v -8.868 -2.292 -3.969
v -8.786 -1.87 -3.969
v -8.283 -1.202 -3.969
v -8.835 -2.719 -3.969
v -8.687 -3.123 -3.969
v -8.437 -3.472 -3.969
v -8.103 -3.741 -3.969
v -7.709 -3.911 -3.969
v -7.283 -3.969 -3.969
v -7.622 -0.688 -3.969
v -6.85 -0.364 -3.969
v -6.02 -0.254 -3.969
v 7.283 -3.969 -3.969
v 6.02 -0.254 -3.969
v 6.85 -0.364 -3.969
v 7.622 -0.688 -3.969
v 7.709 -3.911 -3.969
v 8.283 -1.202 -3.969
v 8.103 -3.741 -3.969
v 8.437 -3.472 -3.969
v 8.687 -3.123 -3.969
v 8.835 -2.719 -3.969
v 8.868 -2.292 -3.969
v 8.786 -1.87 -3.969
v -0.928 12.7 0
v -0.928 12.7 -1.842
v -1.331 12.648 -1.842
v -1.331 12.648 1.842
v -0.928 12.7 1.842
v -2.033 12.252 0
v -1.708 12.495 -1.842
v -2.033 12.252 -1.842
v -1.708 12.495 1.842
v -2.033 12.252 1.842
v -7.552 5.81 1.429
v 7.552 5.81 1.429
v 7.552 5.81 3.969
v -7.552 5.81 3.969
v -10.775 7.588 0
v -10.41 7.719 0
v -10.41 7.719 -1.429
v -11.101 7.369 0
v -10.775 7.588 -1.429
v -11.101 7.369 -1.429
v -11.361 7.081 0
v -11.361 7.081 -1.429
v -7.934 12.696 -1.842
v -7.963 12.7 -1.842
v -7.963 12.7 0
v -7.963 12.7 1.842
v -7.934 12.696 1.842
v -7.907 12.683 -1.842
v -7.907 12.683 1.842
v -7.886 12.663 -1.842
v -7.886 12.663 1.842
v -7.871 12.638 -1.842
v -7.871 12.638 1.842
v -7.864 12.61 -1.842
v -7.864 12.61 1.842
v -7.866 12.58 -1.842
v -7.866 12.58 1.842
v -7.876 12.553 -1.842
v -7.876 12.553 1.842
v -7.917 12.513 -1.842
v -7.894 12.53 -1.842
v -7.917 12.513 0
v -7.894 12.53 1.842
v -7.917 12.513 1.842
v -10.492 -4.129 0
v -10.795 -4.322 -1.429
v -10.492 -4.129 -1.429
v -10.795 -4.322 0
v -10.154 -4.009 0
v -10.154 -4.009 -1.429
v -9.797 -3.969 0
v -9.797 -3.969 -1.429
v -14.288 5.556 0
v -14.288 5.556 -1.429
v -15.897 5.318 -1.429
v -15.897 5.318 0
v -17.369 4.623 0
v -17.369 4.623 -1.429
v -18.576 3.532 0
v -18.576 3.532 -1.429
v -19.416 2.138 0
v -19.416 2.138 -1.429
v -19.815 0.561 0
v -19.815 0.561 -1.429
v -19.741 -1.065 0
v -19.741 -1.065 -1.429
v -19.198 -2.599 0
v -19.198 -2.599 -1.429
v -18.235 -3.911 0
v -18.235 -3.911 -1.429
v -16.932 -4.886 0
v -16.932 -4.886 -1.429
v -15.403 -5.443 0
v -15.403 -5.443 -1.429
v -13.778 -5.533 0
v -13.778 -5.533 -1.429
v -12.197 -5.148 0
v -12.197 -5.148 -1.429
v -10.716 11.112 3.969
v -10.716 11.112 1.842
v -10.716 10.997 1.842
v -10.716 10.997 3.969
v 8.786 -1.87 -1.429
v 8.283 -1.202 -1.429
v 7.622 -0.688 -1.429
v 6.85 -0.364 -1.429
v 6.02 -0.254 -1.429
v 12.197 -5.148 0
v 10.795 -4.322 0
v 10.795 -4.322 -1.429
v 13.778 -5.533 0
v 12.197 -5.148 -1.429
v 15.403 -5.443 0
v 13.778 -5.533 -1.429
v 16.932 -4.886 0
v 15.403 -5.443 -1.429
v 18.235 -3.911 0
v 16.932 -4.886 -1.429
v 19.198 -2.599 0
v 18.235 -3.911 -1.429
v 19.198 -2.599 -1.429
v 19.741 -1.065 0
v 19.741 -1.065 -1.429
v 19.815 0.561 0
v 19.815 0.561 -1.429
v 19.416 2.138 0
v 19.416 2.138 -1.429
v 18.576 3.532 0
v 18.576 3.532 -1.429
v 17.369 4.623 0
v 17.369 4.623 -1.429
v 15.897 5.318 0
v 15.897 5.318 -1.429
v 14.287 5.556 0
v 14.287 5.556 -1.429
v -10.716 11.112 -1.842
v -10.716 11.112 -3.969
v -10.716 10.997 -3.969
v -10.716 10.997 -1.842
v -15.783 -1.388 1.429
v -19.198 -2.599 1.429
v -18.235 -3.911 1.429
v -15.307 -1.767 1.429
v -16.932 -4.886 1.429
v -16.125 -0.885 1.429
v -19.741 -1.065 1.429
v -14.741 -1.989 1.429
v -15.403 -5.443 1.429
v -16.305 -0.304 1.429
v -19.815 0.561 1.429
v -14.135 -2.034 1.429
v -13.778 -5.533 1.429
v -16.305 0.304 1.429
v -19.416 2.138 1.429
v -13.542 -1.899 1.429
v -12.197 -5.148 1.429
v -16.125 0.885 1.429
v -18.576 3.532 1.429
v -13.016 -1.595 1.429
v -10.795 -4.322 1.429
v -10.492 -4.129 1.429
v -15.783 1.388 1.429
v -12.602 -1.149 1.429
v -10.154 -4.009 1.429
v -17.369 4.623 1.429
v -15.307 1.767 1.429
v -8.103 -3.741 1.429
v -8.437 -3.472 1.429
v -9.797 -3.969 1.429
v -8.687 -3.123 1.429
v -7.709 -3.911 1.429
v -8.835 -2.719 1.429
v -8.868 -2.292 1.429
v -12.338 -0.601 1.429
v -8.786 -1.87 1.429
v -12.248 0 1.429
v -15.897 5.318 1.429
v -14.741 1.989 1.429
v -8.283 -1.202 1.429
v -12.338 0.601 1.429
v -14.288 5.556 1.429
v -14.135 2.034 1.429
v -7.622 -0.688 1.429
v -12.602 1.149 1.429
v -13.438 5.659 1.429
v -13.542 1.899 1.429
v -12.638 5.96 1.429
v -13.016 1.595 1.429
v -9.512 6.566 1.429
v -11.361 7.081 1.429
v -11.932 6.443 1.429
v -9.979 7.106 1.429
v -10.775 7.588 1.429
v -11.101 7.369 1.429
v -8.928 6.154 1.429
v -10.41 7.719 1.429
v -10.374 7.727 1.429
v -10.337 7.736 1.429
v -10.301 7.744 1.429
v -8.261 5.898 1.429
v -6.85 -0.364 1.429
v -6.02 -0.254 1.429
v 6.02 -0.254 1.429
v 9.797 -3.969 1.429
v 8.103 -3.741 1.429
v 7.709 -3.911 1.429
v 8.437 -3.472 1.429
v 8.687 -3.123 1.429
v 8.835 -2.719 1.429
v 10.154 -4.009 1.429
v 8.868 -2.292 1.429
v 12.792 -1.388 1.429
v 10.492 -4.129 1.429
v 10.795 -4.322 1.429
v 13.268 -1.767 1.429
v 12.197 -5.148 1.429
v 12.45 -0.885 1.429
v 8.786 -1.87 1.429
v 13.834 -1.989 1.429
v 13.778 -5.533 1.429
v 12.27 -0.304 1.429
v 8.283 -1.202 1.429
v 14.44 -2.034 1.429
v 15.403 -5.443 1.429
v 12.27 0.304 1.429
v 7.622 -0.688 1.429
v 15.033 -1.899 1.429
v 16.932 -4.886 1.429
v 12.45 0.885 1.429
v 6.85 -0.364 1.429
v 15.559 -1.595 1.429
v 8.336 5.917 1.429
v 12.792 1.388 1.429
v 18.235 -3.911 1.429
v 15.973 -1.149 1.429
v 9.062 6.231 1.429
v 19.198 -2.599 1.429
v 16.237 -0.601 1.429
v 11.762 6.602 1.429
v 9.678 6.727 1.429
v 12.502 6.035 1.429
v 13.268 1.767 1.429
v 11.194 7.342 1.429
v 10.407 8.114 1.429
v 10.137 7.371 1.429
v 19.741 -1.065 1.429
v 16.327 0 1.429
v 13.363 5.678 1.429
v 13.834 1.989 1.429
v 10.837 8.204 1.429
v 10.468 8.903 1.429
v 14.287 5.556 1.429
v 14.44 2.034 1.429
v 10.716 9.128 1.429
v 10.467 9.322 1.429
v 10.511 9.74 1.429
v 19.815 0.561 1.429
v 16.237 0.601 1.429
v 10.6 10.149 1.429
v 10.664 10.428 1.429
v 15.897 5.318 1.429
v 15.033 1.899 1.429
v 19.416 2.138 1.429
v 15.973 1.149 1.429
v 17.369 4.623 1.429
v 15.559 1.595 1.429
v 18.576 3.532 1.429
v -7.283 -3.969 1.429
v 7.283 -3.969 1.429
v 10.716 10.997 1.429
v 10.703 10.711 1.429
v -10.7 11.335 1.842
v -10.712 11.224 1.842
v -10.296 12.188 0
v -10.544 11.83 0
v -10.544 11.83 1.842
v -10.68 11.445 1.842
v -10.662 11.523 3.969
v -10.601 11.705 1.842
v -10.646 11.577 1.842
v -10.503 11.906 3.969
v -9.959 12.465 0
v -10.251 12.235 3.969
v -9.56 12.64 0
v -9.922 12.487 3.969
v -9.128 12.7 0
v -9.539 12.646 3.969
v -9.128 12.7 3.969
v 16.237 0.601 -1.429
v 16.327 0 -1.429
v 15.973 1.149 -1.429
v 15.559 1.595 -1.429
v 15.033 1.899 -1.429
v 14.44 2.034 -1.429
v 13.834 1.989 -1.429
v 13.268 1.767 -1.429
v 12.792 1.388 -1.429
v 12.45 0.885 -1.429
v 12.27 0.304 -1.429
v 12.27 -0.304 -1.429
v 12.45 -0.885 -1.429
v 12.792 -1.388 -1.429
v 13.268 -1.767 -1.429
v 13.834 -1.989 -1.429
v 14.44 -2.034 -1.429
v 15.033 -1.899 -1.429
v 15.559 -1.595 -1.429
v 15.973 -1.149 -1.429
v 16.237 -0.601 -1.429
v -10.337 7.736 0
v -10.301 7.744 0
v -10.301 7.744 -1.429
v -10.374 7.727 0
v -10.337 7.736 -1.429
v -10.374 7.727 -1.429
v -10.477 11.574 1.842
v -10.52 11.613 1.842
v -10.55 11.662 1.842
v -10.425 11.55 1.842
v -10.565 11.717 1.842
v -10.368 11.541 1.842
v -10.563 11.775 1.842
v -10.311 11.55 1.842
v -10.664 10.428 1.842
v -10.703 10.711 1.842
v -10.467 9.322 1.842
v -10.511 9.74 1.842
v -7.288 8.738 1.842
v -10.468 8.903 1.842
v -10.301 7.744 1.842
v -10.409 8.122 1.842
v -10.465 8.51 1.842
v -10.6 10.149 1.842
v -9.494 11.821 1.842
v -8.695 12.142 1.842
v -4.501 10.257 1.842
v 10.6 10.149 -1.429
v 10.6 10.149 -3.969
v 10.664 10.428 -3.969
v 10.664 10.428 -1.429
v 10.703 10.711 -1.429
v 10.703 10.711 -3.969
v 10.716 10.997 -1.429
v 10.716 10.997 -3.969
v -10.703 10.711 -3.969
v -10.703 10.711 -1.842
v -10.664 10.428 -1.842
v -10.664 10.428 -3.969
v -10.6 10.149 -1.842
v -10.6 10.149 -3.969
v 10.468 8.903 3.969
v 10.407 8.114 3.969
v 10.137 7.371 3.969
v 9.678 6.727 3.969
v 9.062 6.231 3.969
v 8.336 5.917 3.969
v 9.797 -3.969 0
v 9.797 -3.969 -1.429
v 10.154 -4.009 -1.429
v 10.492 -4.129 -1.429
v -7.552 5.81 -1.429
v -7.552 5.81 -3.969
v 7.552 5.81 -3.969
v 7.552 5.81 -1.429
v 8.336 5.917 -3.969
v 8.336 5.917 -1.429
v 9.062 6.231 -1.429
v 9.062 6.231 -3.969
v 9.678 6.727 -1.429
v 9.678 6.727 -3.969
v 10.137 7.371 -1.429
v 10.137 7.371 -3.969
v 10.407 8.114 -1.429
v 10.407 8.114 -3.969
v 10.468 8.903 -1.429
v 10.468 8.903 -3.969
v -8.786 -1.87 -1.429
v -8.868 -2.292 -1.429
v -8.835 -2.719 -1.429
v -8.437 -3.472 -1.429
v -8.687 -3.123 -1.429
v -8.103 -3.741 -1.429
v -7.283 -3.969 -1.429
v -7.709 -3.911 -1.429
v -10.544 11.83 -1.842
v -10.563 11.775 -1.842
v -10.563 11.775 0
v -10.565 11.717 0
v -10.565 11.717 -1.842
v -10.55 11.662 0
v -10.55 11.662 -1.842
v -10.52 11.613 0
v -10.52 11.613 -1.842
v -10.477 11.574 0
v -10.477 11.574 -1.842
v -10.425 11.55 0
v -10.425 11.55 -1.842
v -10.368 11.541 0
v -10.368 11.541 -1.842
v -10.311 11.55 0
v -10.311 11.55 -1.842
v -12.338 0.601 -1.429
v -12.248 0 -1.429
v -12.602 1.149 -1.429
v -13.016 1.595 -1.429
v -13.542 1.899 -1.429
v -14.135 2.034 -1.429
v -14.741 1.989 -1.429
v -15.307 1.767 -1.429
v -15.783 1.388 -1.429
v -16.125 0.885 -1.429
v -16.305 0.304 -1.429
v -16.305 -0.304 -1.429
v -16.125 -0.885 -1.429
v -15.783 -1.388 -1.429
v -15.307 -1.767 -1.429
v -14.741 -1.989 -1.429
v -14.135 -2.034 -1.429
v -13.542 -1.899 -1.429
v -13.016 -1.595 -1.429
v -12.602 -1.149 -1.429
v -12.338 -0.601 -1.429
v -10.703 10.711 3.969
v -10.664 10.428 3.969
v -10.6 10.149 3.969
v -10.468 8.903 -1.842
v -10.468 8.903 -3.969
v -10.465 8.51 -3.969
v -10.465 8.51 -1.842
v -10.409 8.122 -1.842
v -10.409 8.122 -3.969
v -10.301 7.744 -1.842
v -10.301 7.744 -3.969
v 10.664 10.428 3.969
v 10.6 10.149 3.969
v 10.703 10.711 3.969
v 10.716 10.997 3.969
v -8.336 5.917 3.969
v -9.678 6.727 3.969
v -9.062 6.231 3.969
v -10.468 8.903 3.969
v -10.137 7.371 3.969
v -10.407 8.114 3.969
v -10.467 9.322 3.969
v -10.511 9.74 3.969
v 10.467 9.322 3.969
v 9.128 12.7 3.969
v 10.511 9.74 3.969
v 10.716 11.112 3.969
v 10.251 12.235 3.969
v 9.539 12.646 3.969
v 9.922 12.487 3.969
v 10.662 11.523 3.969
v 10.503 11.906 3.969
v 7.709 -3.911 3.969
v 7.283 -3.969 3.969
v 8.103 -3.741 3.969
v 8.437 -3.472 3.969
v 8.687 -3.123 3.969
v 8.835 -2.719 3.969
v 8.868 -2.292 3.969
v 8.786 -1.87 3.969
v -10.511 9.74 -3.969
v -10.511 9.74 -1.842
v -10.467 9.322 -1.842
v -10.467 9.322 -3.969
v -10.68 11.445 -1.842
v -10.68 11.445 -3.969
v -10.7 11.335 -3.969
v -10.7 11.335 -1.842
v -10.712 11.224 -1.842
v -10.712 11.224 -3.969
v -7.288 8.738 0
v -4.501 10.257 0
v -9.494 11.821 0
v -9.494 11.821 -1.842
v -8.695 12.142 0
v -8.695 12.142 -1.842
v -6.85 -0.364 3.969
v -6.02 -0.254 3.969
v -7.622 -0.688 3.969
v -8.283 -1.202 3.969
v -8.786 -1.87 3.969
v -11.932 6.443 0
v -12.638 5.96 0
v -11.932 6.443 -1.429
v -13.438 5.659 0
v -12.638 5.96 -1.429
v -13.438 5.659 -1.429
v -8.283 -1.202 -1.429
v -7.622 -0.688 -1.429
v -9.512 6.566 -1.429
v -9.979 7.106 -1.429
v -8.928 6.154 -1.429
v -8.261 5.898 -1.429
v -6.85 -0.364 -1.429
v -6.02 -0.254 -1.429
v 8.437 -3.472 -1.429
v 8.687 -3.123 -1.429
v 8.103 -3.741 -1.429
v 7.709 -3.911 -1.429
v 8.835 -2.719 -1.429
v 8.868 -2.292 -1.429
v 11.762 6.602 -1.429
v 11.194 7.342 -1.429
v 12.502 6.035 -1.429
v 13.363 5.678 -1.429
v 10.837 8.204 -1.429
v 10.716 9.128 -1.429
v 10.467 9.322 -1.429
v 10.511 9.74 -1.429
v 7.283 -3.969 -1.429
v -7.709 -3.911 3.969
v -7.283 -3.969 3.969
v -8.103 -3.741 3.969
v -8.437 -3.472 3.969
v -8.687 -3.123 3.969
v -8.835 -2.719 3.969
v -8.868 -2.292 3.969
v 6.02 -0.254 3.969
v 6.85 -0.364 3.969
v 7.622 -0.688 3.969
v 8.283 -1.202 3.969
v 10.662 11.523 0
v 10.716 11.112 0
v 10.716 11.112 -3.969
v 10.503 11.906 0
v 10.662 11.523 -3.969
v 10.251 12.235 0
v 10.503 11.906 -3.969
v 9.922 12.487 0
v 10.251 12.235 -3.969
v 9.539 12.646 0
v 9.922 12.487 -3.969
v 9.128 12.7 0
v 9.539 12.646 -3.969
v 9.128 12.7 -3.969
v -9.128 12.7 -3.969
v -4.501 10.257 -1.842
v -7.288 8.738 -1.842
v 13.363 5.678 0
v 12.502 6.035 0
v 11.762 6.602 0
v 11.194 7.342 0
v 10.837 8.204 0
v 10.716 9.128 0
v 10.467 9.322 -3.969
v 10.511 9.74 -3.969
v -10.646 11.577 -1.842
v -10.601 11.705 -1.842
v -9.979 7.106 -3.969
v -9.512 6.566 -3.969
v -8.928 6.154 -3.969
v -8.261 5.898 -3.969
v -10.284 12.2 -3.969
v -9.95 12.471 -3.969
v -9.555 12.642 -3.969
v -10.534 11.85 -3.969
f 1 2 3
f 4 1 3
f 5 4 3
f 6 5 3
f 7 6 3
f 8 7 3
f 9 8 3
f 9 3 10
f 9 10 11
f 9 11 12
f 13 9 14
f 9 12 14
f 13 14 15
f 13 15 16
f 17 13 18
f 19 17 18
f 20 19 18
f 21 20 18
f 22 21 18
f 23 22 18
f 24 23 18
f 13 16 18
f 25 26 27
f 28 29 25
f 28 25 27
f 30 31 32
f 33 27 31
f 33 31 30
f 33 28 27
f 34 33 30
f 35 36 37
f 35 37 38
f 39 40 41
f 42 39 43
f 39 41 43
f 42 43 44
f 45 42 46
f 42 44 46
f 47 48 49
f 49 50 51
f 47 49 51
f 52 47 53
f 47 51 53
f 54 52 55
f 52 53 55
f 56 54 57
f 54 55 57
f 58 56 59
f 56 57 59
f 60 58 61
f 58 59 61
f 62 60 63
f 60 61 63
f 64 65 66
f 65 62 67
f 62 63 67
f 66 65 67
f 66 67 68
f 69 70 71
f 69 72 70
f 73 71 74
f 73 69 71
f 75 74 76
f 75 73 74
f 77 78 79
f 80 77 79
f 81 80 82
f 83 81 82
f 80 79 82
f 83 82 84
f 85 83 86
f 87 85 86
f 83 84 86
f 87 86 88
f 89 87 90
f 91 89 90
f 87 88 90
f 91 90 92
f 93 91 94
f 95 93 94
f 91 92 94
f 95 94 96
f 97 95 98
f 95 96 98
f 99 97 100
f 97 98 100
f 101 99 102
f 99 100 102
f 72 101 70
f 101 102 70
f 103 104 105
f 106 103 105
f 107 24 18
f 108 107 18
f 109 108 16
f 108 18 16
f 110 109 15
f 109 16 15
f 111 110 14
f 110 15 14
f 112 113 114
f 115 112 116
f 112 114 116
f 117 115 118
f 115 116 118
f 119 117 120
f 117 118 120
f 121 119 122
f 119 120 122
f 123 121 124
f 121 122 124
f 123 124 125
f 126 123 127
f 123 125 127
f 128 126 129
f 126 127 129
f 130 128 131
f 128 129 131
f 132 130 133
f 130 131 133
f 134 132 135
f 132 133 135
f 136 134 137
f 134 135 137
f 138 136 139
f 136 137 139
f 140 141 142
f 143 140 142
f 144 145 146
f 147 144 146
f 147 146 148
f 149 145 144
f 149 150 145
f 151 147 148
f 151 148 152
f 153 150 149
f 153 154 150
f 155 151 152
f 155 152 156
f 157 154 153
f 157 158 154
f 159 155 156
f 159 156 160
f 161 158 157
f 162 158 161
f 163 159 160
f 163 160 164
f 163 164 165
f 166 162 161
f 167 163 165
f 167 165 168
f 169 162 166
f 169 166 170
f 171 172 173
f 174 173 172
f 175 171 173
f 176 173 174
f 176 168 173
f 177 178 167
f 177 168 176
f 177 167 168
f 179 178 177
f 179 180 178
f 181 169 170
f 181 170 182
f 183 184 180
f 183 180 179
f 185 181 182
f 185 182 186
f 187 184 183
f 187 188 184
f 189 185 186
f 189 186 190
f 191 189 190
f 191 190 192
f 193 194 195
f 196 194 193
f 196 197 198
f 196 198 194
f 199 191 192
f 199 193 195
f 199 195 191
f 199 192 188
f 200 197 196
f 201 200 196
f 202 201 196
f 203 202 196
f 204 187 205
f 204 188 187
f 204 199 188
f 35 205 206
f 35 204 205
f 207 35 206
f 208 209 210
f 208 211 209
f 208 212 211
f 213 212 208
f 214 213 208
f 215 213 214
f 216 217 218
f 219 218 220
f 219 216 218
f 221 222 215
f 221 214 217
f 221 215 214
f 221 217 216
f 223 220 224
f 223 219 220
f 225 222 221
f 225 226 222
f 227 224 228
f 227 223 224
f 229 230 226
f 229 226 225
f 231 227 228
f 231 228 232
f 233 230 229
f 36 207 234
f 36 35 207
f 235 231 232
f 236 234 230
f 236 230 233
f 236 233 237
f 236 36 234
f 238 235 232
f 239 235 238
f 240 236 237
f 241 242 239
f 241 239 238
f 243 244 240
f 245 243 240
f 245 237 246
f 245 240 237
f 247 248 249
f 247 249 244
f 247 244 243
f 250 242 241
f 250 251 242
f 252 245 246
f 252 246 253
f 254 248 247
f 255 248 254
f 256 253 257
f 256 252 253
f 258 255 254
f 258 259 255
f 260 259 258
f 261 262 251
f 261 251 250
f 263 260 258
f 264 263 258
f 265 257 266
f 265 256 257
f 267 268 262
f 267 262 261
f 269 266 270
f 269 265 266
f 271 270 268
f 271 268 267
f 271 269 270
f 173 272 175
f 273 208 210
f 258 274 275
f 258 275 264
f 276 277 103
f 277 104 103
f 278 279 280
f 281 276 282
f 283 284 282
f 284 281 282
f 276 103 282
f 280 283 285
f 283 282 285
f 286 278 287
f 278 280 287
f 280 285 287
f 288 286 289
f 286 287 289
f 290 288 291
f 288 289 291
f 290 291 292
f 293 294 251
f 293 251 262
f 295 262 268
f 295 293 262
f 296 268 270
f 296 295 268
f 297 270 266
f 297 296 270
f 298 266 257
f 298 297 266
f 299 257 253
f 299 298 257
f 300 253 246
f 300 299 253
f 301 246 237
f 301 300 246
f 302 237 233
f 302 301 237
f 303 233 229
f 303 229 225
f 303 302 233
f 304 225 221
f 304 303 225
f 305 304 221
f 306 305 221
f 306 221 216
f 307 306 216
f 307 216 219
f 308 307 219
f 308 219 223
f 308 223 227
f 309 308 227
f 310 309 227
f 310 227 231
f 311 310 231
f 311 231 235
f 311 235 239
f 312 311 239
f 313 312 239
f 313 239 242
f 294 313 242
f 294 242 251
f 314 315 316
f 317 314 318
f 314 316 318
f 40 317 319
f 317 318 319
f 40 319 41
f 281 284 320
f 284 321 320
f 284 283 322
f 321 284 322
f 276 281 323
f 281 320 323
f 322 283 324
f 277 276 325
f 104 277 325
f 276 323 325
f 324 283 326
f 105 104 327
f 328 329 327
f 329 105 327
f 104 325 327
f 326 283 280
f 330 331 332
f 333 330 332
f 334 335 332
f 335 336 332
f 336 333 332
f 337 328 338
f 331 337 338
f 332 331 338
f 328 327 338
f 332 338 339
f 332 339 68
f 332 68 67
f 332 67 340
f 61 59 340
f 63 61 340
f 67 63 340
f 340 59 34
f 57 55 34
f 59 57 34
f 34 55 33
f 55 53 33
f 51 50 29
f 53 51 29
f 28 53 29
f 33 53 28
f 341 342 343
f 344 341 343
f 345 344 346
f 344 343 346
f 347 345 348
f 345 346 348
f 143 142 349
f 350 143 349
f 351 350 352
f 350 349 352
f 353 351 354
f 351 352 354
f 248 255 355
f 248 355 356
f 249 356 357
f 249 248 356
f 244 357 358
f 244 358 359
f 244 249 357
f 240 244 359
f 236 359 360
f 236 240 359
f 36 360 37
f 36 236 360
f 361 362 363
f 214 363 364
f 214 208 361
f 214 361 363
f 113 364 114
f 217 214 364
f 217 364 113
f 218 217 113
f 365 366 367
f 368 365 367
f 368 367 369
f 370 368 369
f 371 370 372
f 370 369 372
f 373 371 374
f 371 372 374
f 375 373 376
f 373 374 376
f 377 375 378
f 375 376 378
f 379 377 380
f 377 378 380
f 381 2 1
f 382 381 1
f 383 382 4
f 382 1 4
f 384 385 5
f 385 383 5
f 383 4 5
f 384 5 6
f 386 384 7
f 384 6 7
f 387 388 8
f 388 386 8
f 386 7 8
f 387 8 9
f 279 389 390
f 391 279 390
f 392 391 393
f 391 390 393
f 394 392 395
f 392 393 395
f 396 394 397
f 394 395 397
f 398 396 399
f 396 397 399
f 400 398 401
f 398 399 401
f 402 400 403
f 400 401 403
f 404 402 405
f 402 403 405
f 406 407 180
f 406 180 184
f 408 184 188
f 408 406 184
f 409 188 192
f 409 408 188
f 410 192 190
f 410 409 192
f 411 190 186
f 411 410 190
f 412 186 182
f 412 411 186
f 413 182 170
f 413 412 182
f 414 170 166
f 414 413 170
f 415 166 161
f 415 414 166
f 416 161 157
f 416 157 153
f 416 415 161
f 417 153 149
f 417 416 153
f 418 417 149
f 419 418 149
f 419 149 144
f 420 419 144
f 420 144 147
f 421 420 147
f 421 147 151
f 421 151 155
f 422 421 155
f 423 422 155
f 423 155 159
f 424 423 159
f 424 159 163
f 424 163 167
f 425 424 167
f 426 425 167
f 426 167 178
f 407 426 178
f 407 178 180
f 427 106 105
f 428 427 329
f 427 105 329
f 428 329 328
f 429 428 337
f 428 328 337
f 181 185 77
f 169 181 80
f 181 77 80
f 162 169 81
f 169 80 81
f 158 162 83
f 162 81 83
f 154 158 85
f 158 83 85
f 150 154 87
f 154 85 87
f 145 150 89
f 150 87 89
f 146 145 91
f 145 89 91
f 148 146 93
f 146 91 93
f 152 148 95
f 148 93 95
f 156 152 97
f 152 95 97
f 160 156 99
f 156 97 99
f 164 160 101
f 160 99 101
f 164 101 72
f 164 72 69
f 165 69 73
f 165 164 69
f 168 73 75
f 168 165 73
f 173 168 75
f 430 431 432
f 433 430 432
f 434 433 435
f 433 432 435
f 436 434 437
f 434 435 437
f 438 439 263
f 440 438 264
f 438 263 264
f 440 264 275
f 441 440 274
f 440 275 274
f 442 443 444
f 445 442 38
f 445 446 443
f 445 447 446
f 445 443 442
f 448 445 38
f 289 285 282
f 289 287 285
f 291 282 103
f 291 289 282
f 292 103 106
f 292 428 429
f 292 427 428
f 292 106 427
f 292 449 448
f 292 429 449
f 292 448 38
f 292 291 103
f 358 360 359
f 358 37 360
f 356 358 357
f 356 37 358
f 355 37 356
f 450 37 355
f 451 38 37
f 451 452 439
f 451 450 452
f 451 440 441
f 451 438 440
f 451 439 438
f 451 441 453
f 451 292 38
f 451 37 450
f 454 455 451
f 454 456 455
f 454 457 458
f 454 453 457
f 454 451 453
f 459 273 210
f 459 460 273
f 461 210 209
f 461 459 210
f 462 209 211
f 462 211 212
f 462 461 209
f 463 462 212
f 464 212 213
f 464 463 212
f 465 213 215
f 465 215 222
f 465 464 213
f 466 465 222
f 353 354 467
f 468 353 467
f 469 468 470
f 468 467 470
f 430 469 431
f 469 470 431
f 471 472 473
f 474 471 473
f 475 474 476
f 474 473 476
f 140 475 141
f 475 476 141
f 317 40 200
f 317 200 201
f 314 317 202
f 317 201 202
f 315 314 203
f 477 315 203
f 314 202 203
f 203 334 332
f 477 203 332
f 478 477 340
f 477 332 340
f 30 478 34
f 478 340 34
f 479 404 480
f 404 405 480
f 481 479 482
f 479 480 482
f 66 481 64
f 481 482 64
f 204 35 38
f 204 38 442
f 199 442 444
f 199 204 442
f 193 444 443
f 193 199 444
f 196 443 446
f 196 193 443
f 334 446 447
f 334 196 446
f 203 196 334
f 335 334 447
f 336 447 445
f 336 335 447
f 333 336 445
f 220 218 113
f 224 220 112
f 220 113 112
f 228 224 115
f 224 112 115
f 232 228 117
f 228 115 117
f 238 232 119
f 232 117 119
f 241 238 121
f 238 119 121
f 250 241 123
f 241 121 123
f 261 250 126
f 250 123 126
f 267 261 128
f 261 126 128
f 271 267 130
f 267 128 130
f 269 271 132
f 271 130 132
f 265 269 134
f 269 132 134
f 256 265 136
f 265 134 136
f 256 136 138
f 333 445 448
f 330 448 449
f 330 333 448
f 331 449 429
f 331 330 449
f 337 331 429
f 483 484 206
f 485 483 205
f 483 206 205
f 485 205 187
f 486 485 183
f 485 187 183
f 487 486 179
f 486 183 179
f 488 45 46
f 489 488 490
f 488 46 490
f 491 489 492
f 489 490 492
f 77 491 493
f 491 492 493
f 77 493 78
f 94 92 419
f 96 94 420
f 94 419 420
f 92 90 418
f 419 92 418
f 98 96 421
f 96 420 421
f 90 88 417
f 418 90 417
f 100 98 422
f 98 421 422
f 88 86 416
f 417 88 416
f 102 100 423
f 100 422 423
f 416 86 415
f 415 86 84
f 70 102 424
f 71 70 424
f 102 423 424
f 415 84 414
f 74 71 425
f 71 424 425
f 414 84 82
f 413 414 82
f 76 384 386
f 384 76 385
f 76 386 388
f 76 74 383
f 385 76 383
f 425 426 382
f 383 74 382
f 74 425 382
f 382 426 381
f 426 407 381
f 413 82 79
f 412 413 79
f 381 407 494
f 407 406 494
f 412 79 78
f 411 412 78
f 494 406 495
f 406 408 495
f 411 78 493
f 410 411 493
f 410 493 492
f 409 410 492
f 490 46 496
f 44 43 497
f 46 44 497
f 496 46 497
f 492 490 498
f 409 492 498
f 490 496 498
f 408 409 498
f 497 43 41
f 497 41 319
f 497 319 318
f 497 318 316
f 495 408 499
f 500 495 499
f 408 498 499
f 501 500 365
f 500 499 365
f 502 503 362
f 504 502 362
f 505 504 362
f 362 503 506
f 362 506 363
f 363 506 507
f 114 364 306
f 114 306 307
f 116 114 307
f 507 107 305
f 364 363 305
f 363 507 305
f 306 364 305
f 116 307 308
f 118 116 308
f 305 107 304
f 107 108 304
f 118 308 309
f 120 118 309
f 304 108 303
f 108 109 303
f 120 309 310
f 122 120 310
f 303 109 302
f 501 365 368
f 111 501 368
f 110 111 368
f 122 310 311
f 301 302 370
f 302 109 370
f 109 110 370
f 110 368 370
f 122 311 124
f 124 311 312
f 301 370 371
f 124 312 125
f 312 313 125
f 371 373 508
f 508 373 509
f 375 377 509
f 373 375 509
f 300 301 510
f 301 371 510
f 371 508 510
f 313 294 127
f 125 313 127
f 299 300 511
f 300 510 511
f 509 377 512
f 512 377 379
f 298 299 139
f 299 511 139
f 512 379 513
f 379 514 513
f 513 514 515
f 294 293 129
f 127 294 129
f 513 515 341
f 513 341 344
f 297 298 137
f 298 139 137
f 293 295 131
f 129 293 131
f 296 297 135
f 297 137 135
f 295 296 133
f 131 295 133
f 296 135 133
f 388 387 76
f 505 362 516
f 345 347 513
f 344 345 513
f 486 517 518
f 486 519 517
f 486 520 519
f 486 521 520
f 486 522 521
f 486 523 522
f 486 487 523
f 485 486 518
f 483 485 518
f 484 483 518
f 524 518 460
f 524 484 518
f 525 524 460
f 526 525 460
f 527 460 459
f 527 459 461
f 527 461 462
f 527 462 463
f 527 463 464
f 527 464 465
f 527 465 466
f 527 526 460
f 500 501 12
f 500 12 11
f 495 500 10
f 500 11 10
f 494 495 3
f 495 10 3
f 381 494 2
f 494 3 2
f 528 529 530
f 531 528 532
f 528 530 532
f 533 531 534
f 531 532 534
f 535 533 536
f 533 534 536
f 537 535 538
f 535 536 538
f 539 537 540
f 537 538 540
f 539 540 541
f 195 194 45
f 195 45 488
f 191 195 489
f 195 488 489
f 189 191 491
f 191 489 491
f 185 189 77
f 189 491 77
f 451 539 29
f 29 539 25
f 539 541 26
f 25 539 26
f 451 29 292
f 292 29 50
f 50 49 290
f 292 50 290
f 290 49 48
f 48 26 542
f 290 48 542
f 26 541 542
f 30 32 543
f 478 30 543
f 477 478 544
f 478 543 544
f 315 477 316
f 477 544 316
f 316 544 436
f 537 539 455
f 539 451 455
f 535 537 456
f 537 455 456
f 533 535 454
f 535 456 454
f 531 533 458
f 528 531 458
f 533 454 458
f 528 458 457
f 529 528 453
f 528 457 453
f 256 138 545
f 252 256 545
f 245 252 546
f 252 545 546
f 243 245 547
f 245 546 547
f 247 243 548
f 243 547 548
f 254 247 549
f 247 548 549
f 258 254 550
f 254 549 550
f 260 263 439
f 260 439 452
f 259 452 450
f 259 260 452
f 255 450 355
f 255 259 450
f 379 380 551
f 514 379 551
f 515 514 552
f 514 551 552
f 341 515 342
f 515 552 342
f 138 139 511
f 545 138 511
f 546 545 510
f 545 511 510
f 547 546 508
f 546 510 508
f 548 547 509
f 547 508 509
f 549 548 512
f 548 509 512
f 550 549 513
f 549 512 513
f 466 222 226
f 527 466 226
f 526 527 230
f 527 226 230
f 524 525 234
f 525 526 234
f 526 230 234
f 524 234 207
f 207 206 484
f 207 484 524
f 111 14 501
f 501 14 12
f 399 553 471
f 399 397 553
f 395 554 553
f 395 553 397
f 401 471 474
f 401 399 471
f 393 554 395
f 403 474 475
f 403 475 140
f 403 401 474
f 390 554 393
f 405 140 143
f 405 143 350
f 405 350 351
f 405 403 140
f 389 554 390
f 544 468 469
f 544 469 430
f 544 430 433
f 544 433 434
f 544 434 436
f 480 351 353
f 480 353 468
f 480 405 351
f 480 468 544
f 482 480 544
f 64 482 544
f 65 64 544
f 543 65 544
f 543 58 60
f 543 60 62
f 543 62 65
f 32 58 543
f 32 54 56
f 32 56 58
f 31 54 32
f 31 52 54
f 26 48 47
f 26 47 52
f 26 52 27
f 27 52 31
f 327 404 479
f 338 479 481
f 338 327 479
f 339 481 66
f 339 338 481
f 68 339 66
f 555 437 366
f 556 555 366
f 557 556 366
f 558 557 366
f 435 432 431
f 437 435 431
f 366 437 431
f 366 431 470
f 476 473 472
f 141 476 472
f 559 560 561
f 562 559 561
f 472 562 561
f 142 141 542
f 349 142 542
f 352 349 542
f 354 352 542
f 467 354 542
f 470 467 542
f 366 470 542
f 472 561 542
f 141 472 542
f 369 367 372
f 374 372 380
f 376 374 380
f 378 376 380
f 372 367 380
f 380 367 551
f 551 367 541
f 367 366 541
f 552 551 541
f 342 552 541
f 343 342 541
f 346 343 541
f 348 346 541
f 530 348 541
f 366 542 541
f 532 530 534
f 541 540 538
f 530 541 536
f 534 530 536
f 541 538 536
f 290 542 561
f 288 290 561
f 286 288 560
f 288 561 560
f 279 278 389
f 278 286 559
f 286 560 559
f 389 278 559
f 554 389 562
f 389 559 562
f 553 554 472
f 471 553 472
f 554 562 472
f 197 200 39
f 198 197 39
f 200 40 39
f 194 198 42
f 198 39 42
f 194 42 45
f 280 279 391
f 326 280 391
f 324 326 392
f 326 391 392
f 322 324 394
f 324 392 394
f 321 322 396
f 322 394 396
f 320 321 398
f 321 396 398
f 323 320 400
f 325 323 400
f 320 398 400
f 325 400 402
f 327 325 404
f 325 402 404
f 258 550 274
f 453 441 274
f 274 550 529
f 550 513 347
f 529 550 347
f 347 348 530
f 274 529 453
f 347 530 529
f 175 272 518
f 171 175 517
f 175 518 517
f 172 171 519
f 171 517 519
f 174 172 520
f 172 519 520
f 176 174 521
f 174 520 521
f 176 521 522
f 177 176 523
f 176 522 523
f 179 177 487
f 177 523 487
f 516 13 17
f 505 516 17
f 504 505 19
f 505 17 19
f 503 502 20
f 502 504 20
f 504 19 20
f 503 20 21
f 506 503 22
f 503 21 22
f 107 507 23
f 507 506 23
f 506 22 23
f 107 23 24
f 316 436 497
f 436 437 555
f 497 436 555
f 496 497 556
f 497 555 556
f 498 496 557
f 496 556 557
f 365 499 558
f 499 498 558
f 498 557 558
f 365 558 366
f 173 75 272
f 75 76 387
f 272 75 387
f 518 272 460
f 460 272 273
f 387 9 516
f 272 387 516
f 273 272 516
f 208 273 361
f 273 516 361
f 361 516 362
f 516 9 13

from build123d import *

# Parameters (mm, degrees)
SKETCH2_R           = 5.556250000000001
SKETCH2_R_2         = 2.039937499999998
BOSS_EXTRUDE1_DEPTH = 3.96875
CUT_EXTRUDE1_START  = -2.54
SKETCH3_R           = 2.039937499999998
CUT_EXTRUDE1_DEPTH  = 2.54
FILLET1_R           = 1.5875
FILLET2_R           = 3.175
CUT_EXTRUDE2_START  = -2.12725
SKETCH4_R           = 17.604048203812315
SKETCH4_R_2         = 13.921048203812312
CUT_EXTRUDE2_DEPTH  = 1.8415
MIRROR1_START       = -3.96875
MIRROR1_DEPTH       = 3.96875
MIRROR1_START_2     = -1.42875
MIRROR1_2_OUTLINE_R = 2.0399375
MIRROR1_2_DEPTH     = 1.42875
MIRROR1_3_DEPTH     = 2.12725
FILLET3_R           = 1.5875
FILLET4_R           = 0.1984375
FILLET5_R           = 0.09921875


with BuildPart() as part:
    # Sketch2 → Boss-Extrude1 (new body)
    # profile 1 of 3: a face of its own
    with BuildSketch(Plane.XY):
        with Locations((-14.2875, 0)):
            Circle(SKETCH2_R)
        with Locations((-14.2875, 0)):
            Circle(SKETCH2_R_2, mode=Mode.SUBTRACT)
    # profile 2 of 3: a face of its own
    with BuildSketch(Plane.XY):
        with Locations((14.2875, 0)):
            Circle(SKETCH2_R)
        with Locations((14.2875, 0)):
            Circle(SKETCH2_R_2, mode=Mode.SUBTRACT)
    # profile 3 of 3: a face of its own
    with BuildSketch(Plane.XY):
        with BuildLine():
            Line((-10.715625, 12.699999999999998), (-10.715625, 9.128124999999997))
            ThreePointArc((-10.715625, 9.128124999999997), (-11.76180296762913, 6.6024279642694665), (-14.28750000475128, 5.556249999999996))
            ThreePointArc((-14.287500004751278, 5.556250000000001), (-10.358637948712076, 3.9288620546475865), (-8.73125, 0))
            ThreePointArc((-8.73125, -1.36e-15), (-9.165110266752894, -2.1524491824952943), (-10.398935033331705, -3.968750000000002))
            Line((-10.398935033331705, -3.9687500000000018), (10.398935033331705, -3.9687500000000018))
            ThreePointArc((10.398935033331703, -3.968750000000001), (9.143412067733138, 2.1000650960402263), (14.287499984624889, 5.556250000000001))
            ThreePointArc((14.287499984624889, 5.556249999999996), (11.761802960513377, 6.60242797138522), (10.715625, 9.128124999999997))
            Line((10.715625, 9.128124999999997), (10.715625, 12.699999999999998))
            Line((10.715625, 12.699999999999998), (0, 12.699999999999998))
            Line((0, 12.699999999999998), (-10.715625, 12.699999999999998))
        make_face()
    extrude(amount=BOSS_EXTRUDE1_DEPTH)

    # Sketch3 → Cut-Extrude1 (cut)
    with BuildSketch(Plane.XY.offset(3.96875).offset(CUT_EXTRUDE1_START)):
        with BuildLine():
            ThreePointArc((-7.552307909198136, 5.810250000000002), (-9.677647571923792, 6.727460510546287), (-10.468249900083975, 8.903073472752357))
            ThreePointArc((-10.468249900083975, 8.903073472752357), (-10.506779246316498, 9.714188220388294), (-10.715624999999989, 10.498901604702587))
            Line((-10.715625, 10.498901604702585), (-10.715625, 9.128124999999997))
            ThreePointArc((-10.715624999999998, 9.128124999999997), (-11.76180296762913, 6.6024279642694665), (-14.28750000475128, 5.556249999999997))
            ThreePointArc((-14.28750000475128, 5.556250000000002), (-19.43158792846333, -2.1000651053569315), (-10.398935033331707, -3.9687500000000058))
            Line((-10.398935033331705, -3.9687500000000018), (-10.043913250562724, -3.9687500000000018))
            ThreePointArc((-10.043913250562714, -3.968750000000039), (-8.931023957684667, -2.251037420968806), (-8.482804567636641, -0.2540000000000033))
            Line((-8.482804567636643, -0.254), (8.482804567636643, -0.254))
            ThreePointArc((8.482804567636641, -0.25399999999999856), (8.93102395768462, -2.2510374209686943), (10.043913250562554, -3.968749999999868))
            Line((10.04391325056251, -3.9687500000000018), (10.398935033331705, -3.9687500000000018))
            ThreePointArc((10.398935033331703, -3.968750000000001), (19.431587932266865, -2.1000650960402254), (14.287499984624894, 5.556250000000003))
            ThreePointArc((14.28749998462489, 5.556249999999997), (11.761802960513378, 6.60242797138522), (10.715625, 9.128124999999997))
            Line((10.715625, 9.128124999999997), (10.715625, 10.498901604702809))
            ThreePointArc((10.715625000000067, 10.498901604702796), (10.506779255556298, 9.71418827999466), (10.468249892987725, 8.903073593179762))
            ThreePointArc((10.468249892987725, 8.90307359317976), (9.6776476133017, 6.727460554434185), (7.552307909198134, 5.810250000000002))
            Line((7.552307909198135, 5.810250000000002), (0, 5.810250000000002))
            Line((0, 5.810250000000002), (-7.552307909198135, 5.810250000000002))
        make_face()
        with Locations((-14.2875, 0)):
            Circle(SKETCH3_R, mode=Mode.SUBTRACT)
        with Locations((14.2875, 0)):
            Circle(SKETCH3_R, mode=Mode.SUBTRACT)
    extrude(amount=CUT_EXTRUDE1_DEPTH, mode=Mode.SUBTRACT)

    # Fillet1
    fillet1_edges = [part.edges().sort_by_distance(p)[0] for p in [
        (-10.715625, 12.699999999999998, 1.984375),
        (10.715625, 12.699999999999998, 1.984375),
        (10.043913250562532, -3.968749999999936, 2.69875),
        (-10.043913250562719, -3.9687500000000204, 2.69875),
    ]]
    fillet(fillet1_edges, radius=FILLET1_R)

    # Fillet2
    # the kernel refuses this fillet: 3.175 mm, written as the material it takes off along each edge
    with BuildSketch(Plane(origin=(10.715625000000033, 10.498901604702802, 1.42875), x_dir=(-0.3129675525717291, -0.9497638185555723, 0), z_dir=(0, 0, 1))) as fillet2_piece_1:
        with BuildLine():
            CenterArc((0.5207906104453346, -3.1713246792527547), FILLET2_R, 92.75711760707199, 15.4810427085975)
            Line((-0.47288136896990385, -0.15582455533881112), (0, 0))
            ThreePointArc((0, 0), (0.1840330456266841, -0.00442876150043089), (0.3680660912533638, 0))
        make_face()
    extrude(amount=3.784734111079021, mode=Mode.SUBTRACT)
    with BuildSketch(Plane(origin=(-10.715624999999994, 10.498901604702585, 1.42875), x_dir=(0.31296755257180836, -0.949763818555546, 0), z_dir=(0, 0, 1))) as fillet2_piece_2:
        with BuildLine():
            CenterArc((0.520790610445383, 3.1713246792527405), FILLET2_R, 251.7618396843257, 15.481042708597613)
            Line((-0.4728813689701088, 0.1558245553388813), (0, 0))
            ThreePointArc((0, 0), (0.18403304562657702, 0.00442876150044717), (0.3680660912531513, -1e-17))
        make_face()
    extrude(amount=3.784734111079562, mode=Mode.SUBTRACT)
    with BuildSketch(Plane(origin=(8.482804567636641, -0.25399999999999934, 1.42875), x_dir=(0.18466066844771437, -0.9828023389921513, 0), z_dir=(0, 0, 1))) as fillet2_piece_3:
        with BuildLine():
            CenterArc((2.665698104684143, -3.006301625224905), FILLET2_R, 108.76131112774725, 60.59733959481885)
            Line((-0.4546993216159375, -2.4200040029034118), (0, 0))
            ThreePointArc((0, 0), (0.8222671445716088, -0.05847794215052012), (1.644534289143218, 1e-17))
        make_face()
    extrude(amount=8.695876687740405, mode=Mode.SUBTRACT)
    with BuildSketch(Plane(origin=(-8.482804567636641, -0.2540000000000016, 1.42875), x_dir=(1, 6.5e-16, 0), z_dir=(0, 0, 1))) as fillet2_piece_4:
        with BuildLine():
            CenterArc((2.462350675096158, -3.175), FILLET2_R, 89.99999999999996, 60.59733959481888)
            ThreePointArc((-0.3036808011183762, -1.6162521459227466), (-0.09436814223421007, -0.8189246488483356), (0, 0))
            Line((0, 0), (2.46235067509616, 0))
        make_face()
    extrude(amount=8.695876687740402, mode=Mode.SUBTRACT)

    # Sketch4 → Cut-Extrude2 (cut)
    with BuildSketch(Plane.XY.offset(3.96875).offset(CUT_EXTRUDE2_START)):
        with Locations((-14.2875, 24.89067320381231)):
            Circle(SKETCH4_R)
        with Locations((-14.2875, 24.89067320381231)):
            Circle(SKETCH4_R_2, mode=Mode.SUBTRACT)
    extrude(amount=-CUT_EXTRUDE2_DEPTH, mode=Mode.SUBTRACT)

    # Mirror1: read off the stored shape, not the designer's step
    # Mirror1 outline → Mirror1 (add)
    with BuildSketch(Plane.XY.offset(MIRROR1_START)):
        with BuildLine():
            ThreePointArc((-1.5875, 12.7), (-5.58418864, 9.588552941), (-10.301362468, 7.743859484))
            ThreePointArc((-10.301362468, 7.743859484), (-9.232794937, 6.342065129), (-7.552307909, 5.81025))
            Line((-7.552307909, 5.81025), (7.552307909, 5.81025))
            ThreePointArc((7.552307909, 5.81025), (9.677647591, 6.727460531), (10.468249897, 8.903073529))
            ThreePointArc((10.468249897, 8.903073529), (10.482964805, 9.531648806), (10.600432256, 10.149325748))
            ThreePointArc((10.600432256, 10.149325748), (10.686695012, 10.569164005), (10.715625, 10.996795249))
            Line((10.715625, 10.996795249), (10.715625, 11.1125))
            ThreePointArc((10.715625, 11.1125), (10.250657015, 12.235032015), (9.128125, 12.7))
            Line((9.128125, 12.7), (-1.5875, 12.7))
        make_face()
        with BuildLine():
            ThreePointArc((-8.786485369, -1.870252146), (-8.5740892, -3.3056274), (-7.283475907, -3.96875))
            Line((-7.283475907, -3.96875), (7.283475907, -3.96875))
            ThreePointArc((7.283475907, -3.96875), (8.5740892, -3.3056274), (8.786485369, -1.870252146))
            ThreePointArc((8.786485369, -1.870252146), (7.622265455, -0.687681938), (6.020453893, -0.254))
            Line((6.020453893, -0.254), (-6.020453893, -0.254))
            ThreePointArc((-6.020453893, -0.254), (-7.622265455, -0.687681938), (-8.786485369, -1.870252146))
        make_face()
        with BuildLine():
            ThreePointArc((-10.680399967, 11.445063792), (-9.085054176, 11.978270618), (-7.56566469, 12.7))
            Line((-7.56566469, 12.7), (-9.128125, 12.7))
            ThreePointArc((-9.128125, 12.7), (-10.126175908, 12.347024457), (-10.680399967, 11.445063792))
        make_face()
    extrude(amount=MIRROR1_DEPTH)

    # Mirror1 2 outline → Mirror1 2 (add)
    with BuildSketch(Plane.XY.offset(MIRROR1_START_2)):
        with BuildLine():
            ThreePointArc((-10.301362468, 7.743859484), (-10.683167713, 7.659558848), (-11.066751055, 7.583758707))
            ThreePointArc((-11.066751055, 7.583758707), (-12.384606458, 6.105330402), (-14.2875, 5.55625))
            ThreePointArc((-14.2875, 5.55625), (-19.431587929, -2.100065103), (-10.398935033, -3.96875))
            Line((-10.398935033, -3.96875), (-7.283475907, -3.96875))
            ThreePointArc((-7.283475907, -3.96875), (-8.5740892, -3.3056274), (-8.786485369, -1.870252146))
            ThreePointArc((-8.786485369, -1.870252146), (-7.622265455, -0.687681938), (-6.020453893, -0.254))
            Line((-6.020453893, -0.254), (6.020453893, -0.254))
            ThreePointArc((6.020453893, -0.254), (7.622265455, -0.687681938), (8.786485369, -1.870252146))
            ThreePointArc((8.786485369, -1.870252146), (8.5740892, -3.3056274), (7.283475907, -3.96875))
            Line((7.283475907, -3.96875), (10.398935033, -3.96875))
            ThreePointArc((10.398935033, -3.96875), (19.431587929, -2.100065103), (14.2875, 5.55625))
            ThreePointArc((14.2875, 5.55625), (11.761802966, 6.602427966), (10.715625, 9.128125))
            Line((10.715625, 9.128125), (10.715625, 10.996795249))
            ThreePointArc((10.715625, 10.996795249), (10.686695012, 10.569164005), (10.600432256, 10.149325748))
            ThreePointArc((10.600432256, 10.149325748), (10.482964805, 9.531648806), (10.468249897, 8.903073529))
            ThreePointArc((10.468249897, 8.903073529), (9.677647591, 6.727460531), (7.552307909, 5.81025))
            Line((7.552307909, 5.81025), (-7.552307909, 5.81025))
            ThreePointArc((-7.552307909, 5.81025), (-9.232794937, 6.342065129), (-10.301362468, 7.743859484))
        make_face()
        with Locations((-14.2875, 0)):
            Circle(MIRROR1_2_OUTLINE_R, mode=Mode.SUBTRACT)
        with Locations((14.2875, 0)):
            Circle(MIRROR1_2_OUTLINE_R, mode=Mode.SUBTRACT)
    extrude(amount=MIRROR1_2_DEPTH)

    # Mirror1 3 outline → Mirror1 3 (add)
    with BuildSketch(Plane.XY.offset(MIRROR1_START)):
        with BuildLine():
            ThreePointArc((-10.468249897, 8.903073529), (-10.443499838, 8.315016615), (-10.301362468, 7.743859484))
            ThreePointArc((-10.301362468, 7.743859484), (-5.58418864, 9.588552941), (-1.5875, 12.7))
            Line((-1.5875, 12.7), (-7.56566469, 12.7))
            ThreePointArc((-7.56566469, 12.7), (-9.085054176, 11.978270618), (-10.680399967, 11.445063792))
            ThreePointArc((-10.680399967, 11.445063792), (-10.70679418, 11.27971205), (-10.715625, 11.1125))
            Line((-10.715625, 11.1125), (-10.715625, 10.996795249))
            ThreePointArc((-10.715625, 10.996795249), (-10.686695012, 10.569164005), (-10.600432256, 10.149325748))
            ThreePointArc((-10.600432256, 10.149325748), (-10.482964805, 9.531648806), (-10.468249897, 8.903073529))
        make_face()
    extrude(amount=MIRROR1_3_DEPTH)

    # Fillet3
    fillet3_edges = [part.edges().sort_by_distance(p)[0] for p in [
        (-1.5875000000000001, 12.7, -0.92075),
        (-11.0667510545982, 7.583758707206023, 0.714375),
        (10.398935033331703, -3.9687500000000013, 0.714375),
        (-10.398935033331705, -3.9687500000000018, 0.714375),
    ]]
    fillet(fillet3_edges, radius=FILLET3_R)

    # Fillet4
    # the kernel refuses this fillet: 0.1984375 mm, written as the material it takes off along each edge
    with BuildSketch(Plane(origin=(-10.680399967281256, 11.445063792304536, 0), x_dir=(0.9621801124041967, 0.2724140805719251, 0), z_dir=(0, 0, 1))) as fillet4_piece_1:
        with BuildLine():
            CenterArc((0.38144862686573777, 0.1984186072365745), FILLET4_R, 137.3415044379145, 133.4491322184)
            ThreePointArc((0.2355165674481968, 0.3328852404226754), (0.10702546563184087, 0.17403609738966894), (0, 0))
            ThreePointArc((0, 0), (0.1920934106306479, -0.00132538996079977), (0.384186821261299, 0))
        make_face()
    extrude(amount=1.8415, mode=Mode.SUBTRACT)
    with BuildSketch(Plane(origin=(-10.680399967, 11.445063791999997, -1.8415), x_dir=(0.962180112277252, 0.2724140810203004, 0), z_dir=(0, 0, 1))) as fillet4_piece_2:
        with BuildLine():
            CenterArc((0.3814486268633621, 0.19841860723671206), FILLET4_R, 137.34150443483912, 133.44913221859187)
            ThreePointArc((0.23551656745303873, 0.3328852404306458), (0.10702546562937841, 0.17403609739708187), (0, 0))
            ThreePointArc((0, 0), (0.19209341062446852, -0.00132538995592385), (0.38418682124893766, 1e-17))
        make_face()
    extrude(amount=1.8415, mode=Mode.SUBTRACT)

    # Fillet5
    fillet5_edges = [part.edges().sort_by_distance(p)[0] for p in [
        (-7.565664690300835, 12.699999999999998, 0.92075),
    ]]
    fillet(fillet5_edges, radius=FILLET5_R)


solid = part.part
